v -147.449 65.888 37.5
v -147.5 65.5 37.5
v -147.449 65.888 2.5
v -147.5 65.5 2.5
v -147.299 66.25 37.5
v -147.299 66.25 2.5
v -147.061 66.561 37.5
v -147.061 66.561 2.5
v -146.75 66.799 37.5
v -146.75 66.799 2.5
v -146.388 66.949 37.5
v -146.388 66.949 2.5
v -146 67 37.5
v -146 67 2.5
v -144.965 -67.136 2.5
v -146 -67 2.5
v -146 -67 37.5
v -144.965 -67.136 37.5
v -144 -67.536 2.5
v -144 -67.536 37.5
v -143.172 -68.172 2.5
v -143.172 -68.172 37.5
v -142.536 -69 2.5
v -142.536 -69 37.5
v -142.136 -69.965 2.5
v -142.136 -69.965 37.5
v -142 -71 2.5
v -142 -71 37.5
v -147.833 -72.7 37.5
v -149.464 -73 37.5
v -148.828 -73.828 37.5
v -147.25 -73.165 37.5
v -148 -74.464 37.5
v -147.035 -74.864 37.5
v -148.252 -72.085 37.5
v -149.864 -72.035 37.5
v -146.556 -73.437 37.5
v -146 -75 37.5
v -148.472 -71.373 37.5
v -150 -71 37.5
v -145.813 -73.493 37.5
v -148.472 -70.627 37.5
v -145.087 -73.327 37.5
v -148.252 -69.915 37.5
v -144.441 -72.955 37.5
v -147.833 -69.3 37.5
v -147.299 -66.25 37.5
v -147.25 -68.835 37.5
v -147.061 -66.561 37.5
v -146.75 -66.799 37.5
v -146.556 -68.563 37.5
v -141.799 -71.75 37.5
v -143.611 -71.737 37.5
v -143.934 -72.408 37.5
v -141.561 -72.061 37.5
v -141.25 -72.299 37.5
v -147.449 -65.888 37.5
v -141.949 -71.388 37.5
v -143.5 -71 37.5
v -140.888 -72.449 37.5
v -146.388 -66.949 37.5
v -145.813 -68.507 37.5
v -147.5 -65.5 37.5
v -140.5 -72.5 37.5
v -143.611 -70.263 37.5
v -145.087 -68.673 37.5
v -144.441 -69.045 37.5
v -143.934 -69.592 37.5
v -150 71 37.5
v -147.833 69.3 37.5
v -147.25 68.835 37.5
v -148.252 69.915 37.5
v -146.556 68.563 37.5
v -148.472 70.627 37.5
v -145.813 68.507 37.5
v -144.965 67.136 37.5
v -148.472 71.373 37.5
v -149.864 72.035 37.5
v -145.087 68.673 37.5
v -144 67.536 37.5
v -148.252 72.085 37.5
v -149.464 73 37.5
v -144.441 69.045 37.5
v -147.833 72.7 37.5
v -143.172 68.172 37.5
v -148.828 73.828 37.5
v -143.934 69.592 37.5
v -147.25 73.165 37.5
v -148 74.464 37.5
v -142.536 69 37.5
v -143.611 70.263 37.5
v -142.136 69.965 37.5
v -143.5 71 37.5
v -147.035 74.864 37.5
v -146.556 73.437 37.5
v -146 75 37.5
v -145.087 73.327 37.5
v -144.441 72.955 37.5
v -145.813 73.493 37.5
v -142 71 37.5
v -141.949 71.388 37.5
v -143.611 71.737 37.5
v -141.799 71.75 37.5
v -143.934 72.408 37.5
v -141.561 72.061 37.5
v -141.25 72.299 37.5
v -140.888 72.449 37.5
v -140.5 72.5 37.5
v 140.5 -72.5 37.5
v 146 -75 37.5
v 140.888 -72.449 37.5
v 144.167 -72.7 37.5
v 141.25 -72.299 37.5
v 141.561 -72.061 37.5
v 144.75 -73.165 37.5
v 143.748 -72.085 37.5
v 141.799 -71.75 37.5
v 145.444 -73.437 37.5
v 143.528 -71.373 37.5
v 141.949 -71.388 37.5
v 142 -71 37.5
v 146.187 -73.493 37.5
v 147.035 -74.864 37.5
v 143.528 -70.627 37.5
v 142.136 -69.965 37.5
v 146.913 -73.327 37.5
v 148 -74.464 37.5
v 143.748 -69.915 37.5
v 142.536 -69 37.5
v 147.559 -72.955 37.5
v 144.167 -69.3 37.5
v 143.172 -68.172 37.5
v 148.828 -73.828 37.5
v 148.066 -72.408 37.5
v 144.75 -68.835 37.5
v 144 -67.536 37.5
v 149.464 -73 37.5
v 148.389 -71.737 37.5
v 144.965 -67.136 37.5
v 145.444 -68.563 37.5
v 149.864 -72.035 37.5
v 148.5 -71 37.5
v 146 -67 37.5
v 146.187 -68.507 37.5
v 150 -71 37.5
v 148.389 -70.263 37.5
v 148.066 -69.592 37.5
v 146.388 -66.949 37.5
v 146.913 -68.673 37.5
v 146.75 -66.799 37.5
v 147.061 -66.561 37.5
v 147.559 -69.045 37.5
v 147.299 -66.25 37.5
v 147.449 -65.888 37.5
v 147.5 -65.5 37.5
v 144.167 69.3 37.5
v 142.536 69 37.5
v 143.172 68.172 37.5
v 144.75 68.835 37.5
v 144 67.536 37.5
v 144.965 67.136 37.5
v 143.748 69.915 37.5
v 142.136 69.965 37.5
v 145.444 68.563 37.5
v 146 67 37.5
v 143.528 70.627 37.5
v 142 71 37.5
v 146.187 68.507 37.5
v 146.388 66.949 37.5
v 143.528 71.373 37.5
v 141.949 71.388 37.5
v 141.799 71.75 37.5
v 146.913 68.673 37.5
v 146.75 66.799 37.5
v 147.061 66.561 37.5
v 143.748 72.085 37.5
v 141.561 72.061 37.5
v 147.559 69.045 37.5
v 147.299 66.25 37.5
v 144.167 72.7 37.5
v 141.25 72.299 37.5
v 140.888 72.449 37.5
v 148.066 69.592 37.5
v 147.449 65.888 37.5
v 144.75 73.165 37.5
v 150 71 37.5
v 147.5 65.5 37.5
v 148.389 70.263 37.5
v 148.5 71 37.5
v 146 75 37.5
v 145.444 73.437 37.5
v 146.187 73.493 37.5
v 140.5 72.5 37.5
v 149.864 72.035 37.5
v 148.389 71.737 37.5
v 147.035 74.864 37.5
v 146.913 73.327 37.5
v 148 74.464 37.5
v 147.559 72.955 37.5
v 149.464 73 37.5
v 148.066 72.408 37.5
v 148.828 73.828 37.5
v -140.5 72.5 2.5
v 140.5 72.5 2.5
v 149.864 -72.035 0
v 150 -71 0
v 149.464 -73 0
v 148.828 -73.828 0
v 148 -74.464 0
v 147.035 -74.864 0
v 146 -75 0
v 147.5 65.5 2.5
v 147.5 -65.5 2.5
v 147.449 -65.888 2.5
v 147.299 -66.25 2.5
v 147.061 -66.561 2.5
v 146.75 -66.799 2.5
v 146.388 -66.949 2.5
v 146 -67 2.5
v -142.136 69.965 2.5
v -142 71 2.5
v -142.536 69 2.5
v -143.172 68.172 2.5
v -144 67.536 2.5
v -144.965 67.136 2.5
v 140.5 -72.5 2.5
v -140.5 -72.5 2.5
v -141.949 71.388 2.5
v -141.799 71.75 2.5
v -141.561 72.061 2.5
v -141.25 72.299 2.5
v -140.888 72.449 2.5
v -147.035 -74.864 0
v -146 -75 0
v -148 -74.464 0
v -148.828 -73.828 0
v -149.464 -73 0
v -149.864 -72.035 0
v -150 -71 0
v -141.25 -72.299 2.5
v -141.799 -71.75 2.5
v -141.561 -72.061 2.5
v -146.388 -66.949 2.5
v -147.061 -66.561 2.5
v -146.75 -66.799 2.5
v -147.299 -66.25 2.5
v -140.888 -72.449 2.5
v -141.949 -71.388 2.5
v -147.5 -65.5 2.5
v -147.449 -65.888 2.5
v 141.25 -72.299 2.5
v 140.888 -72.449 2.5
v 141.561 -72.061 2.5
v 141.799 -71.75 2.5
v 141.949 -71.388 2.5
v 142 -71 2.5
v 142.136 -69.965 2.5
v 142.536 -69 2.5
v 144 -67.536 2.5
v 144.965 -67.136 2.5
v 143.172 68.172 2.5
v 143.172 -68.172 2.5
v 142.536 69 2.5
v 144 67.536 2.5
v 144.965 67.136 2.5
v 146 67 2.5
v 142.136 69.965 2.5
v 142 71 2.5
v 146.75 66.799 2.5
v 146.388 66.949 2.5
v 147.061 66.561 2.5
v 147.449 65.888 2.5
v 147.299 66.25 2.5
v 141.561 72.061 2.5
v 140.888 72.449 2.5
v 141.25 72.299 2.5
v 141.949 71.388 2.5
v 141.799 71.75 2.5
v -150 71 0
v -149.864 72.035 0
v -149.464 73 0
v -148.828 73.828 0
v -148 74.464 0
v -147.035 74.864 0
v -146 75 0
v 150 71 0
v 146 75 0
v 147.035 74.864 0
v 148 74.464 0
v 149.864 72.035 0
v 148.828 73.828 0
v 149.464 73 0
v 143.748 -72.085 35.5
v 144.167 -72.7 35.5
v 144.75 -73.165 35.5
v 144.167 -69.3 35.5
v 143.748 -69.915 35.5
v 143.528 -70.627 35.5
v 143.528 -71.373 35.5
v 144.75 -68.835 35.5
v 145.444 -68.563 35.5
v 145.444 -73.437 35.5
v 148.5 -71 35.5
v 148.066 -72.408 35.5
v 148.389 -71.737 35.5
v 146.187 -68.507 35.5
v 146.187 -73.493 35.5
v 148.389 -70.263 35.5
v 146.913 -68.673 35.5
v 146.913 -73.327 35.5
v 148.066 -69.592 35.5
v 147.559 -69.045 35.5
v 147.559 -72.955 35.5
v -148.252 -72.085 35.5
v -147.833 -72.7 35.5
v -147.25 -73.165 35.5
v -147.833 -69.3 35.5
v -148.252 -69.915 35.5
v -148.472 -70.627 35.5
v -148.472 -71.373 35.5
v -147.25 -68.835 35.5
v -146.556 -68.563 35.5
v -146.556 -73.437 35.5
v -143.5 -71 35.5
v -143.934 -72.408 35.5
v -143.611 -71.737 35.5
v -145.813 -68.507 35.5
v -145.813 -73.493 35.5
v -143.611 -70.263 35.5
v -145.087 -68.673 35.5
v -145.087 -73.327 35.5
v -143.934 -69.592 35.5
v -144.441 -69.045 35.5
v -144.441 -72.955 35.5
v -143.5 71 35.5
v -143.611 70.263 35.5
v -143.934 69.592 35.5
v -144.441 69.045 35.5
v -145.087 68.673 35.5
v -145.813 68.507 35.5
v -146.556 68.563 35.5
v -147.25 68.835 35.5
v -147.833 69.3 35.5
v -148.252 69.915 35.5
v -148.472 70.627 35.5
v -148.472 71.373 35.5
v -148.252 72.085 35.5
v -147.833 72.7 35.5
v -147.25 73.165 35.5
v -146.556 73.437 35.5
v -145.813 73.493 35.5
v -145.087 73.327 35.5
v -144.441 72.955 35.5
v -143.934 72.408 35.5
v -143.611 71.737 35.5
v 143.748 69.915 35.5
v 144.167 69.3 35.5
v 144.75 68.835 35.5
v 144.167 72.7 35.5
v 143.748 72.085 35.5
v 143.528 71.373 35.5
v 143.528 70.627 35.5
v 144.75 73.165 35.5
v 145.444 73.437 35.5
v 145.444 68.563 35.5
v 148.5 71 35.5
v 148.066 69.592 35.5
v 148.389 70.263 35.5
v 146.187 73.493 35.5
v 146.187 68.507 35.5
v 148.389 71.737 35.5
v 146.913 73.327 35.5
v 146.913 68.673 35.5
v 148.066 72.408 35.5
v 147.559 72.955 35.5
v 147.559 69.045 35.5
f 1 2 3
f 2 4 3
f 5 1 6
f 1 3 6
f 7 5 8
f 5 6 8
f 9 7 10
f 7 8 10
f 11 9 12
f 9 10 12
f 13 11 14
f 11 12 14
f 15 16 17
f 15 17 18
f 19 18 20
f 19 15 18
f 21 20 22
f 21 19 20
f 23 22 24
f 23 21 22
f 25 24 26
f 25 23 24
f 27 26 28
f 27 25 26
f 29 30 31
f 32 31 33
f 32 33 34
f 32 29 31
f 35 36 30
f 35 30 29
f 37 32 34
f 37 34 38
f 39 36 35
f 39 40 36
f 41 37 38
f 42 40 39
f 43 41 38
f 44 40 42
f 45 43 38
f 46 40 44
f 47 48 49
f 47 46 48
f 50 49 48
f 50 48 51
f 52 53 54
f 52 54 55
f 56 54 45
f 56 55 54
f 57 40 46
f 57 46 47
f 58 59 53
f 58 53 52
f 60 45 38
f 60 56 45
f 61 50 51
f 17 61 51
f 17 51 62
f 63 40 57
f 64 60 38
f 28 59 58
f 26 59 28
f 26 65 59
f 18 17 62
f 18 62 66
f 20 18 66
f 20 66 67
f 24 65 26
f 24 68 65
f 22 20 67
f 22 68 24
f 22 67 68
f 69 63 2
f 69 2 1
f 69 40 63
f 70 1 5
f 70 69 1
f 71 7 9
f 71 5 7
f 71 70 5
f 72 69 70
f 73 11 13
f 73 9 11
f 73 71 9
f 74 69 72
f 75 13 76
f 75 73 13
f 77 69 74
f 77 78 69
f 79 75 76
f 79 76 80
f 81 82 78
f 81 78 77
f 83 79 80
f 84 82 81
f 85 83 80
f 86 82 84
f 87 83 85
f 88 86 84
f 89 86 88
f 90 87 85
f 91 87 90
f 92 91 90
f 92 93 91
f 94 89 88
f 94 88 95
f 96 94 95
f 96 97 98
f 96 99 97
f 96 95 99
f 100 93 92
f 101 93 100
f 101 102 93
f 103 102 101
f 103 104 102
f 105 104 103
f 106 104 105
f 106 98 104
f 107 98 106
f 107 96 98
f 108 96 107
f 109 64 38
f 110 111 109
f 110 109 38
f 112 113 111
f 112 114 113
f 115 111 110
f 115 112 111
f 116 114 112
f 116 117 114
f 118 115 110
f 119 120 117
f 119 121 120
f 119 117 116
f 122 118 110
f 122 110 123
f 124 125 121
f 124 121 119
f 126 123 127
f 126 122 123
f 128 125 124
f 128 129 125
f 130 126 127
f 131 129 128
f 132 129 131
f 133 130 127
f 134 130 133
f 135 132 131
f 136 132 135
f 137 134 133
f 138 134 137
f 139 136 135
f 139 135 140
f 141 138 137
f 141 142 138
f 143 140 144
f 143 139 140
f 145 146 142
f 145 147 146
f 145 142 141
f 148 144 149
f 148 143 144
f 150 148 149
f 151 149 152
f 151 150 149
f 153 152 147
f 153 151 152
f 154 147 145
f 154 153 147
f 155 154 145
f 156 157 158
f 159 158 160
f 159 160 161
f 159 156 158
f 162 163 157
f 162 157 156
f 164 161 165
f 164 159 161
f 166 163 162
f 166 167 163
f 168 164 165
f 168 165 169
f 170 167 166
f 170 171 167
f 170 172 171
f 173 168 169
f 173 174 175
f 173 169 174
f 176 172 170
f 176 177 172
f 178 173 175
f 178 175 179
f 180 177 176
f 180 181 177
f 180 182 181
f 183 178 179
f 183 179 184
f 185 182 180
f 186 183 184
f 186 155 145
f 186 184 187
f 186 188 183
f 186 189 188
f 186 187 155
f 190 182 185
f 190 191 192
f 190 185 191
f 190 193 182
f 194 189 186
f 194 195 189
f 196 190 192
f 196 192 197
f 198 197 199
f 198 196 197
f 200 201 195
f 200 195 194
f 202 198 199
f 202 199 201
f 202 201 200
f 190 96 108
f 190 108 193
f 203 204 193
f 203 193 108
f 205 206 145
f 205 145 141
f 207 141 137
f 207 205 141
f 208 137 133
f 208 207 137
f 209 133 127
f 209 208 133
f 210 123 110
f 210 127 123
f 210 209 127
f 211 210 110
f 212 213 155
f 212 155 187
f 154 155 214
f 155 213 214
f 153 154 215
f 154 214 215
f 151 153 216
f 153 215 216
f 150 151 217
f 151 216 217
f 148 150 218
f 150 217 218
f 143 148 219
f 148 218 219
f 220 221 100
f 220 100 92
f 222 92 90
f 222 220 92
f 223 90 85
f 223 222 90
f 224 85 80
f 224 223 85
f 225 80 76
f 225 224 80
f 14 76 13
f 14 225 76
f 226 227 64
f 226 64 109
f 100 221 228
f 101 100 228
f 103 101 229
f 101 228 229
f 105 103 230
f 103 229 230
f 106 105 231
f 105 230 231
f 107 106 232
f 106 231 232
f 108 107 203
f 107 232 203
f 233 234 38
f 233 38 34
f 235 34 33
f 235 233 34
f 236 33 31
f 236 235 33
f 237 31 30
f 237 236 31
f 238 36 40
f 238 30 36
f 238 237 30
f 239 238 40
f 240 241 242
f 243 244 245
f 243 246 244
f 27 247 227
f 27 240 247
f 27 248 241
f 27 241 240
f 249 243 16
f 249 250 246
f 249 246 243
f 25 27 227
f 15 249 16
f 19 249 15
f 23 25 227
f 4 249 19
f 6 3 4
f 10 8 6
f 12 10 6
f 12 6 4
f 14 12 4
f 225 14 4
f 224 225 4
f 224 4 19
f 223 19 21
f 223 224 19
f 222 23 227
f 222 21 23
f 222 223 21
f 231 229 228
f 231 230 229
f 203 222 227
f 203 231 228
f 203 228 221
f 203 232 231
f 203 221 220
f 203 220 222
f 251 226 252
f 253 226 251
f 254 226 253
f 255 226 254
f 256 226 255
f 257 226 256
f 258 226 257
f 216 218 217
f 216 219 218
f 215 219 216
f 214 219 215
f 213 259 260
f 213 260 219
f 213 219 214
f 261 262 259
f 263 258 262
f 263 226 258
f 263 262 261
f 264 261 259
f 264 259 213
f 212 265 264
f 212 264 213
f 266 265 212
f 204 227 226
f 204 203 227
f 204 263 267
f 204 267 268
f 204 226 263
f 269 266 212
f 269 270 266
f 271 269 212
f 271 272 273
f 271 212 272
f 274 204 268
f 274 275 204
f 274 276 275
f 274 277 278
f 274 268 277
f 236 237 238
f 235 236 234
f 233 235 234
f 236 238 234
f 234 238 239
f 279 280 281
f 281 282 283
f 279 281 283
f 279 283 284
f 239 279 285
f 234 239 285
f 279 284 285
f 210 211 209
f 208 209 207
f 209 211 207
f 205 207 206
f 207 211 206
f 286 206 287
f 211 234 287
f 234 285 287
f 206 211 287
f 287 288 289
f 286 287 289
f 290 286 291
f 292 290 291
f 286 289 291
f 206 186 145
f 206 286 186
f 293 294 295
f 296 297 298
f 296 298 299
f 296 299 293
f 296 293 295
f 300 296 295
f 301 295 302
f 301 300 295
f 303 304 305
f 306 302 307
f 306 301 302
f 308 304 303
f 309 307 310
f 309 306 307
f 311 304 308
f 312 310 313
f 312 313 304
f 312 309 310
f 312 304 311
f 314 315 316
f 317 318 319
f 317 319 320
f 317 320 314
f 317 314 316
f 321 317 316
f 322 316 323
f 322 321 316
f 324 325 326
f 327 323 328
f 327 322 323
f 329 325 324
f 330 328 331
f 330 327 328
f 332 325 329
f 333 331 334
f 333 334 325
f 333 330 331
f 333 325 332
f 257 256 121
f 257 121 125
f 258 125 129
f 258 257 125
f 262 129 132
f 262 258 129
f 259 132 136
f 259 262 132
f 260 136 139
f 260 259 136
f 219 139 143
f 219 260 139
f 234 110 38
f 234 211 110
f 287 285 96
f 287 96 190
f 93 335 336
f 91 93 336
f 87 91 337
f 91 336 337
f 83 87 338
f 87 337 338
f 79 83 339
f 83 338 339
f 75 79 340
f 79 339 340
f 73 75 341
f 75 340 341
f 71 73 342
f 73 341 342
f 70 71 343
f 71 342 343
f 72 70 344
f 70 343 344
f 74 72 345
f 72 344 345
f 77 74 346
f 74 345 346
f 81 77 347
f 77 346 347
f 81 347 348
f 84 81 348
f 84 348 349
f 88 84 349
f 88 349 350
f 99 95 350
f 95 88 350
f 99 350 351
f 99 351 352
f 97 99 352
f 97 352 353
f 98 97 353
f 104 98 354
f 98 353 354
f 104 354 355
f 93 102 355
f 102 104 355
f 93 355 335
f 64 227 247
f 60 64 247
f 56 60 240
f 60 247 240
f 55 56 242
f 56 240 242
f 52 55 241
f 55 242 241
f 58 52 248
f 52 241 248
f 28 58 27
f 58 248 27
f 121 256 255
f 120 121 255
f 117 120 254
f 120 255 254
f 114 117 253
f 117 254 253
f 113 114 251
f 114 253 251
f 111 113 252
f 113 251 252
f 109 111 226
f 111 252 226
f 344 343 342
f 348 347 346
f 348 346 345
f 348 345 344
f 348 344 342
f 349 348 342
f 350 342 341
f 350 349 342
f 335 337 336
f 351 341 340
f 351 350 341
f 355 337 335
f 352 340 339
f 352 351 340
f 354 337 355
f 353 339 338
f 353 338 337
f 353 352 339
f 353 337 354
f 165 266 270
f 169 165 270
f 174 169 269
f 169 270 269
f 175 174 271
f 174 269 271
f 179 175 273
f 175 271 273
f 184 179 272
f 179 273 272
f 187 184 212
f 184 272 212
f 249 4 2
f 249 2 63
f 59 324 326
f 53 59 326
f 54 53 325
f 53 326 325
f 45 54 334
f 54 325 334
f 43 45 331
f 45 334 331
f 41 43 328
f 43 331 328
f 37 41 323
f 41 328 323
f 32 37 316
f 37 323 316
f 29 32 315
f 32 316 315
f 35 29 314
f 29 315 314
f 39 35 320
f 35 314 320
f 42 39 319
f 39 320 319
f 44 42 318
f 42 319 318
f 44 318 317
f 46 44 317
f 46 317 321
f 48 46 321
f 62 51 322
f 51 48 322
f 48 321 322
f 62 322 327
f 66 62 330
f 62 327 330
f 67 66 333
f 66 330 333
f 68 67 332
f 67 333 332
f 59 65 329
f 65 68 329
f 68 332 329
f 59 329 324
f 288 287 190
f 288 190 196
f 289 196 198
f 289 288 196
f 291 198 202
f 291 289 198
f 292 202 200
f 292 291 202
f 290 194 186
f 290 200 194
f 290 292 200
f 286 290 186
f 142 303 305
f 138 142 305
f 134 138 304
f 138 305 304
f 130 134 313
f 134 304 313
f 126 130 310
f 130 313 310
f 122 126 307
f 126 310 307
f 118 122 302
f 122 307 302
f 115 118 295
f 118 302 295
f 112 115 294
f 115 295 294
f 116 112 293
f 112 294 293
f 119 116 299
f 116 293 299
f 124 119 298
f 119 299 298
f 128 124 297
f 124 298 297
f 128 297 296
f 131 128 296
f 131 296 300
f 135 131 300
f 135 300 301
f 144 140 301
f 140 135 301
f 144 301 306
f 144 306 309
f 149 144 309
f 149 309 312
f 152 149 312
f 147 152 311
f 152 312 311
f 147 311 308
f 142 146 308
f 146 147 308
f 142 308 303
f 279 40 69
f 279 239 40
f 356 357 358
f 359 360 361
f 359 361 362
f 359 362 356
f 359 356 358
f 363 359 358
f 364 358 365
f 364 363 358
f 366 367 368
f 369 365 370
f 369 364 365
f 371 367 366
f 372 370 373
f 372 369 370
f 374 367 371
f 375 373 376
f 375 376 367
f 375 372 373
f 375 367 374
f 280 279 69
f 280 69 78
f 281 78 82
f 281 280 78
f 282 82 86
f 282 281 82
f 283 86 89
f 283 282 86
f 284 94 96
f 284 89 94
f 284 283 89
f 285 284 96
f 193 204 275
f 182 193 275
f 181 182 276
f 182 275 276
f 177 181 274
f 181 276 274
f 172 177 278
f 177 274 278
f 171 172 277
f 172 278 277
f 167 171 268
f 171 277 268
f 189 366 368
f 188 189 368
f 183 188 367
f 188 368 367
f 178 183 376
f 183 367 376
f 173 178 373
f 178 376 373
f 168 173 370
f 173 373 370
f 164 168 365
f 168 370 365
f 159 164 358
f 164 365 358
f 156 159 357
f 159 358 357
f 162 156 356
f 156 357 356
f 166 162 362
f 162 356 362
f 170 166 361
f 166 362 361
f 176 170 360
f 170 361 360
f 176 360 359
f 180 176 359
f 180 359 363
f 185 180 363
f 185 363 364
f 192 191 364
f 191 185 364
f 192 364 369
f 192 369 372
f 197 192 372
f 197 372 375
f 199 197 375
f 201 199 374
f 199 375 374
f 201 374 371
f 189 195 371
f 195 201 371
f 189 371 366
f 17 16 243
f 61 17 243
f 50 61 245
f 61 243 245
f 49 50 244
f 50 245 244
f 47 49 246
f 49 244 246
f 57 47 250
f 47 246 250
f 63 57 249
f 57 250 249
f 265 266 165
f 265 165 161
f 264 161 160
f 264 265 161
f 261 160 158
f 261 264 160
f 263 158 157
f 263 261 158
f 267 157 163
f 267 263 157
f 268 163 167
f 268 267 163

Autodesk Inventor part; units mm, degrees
ref_plane "YZ Plane" through (0, 0, 0) normal (1, 0, 0) x (0, 1, 0)
ref_plane "XZ Plane" through (0, 0, 0) normal (0, 1, 0) x (-1, 0, 0)
ref_plane "XY Plane" through (0, 0, 0) normal (0, 0, 1) x (1, 0, 0)
sketch "Sketch1" plane through (0, 0, 0) normal (0, 0, 1) x (1, 0, 0)
  line L0 (-150, -75) -> (150, -75) construction
  line L1 (150, -75) -> (150, 75) construction
  line L2 (150, 75) -> (-150, 75) construction
  line L3 (-150, 75) -> (-150, -75) construction
  line L4 (-150, -75) -> (150, 75) construction
  line L5 (150, -75) -> (-150, 75) construction
  line L6 (147.5, -72.5) -> (-147.5, -72.5) construction
  line L7 (-147.5, -72.5) -> (-147.5, 72.5) construction
  line L8 (-147.5, 72.5) -> (147.5, 72.5) construction
  line L9 (147.5, 72.5) -> (147.5, -72.5) construction
  line L10 (147.5, -72.5) -> (-147.5, 72.5) construction
  line L11 (-147.5, -72.5) -> (147.5, 72.5) construction
  line L12 (-150, 75) -> (-146, 75) construction
  line L13 (-146, 75) -> (-146, 71) construction
  line L14 (-146, 71) -> (-150, 71) construction
  line L15 (-150, 71) -> (-150, 75) construction
  arc A0 (-146, 75) -> (-150, 71) centre (-146, 71) ccw
  line L16 (-150, -75) -> (-146, -75) construction
  line L17 (-146, -75) -> (-146, -71) construction
  line L18 (-146, -71) -> (-150, -71) construction
  line L19 (-150, -71) -> (-150, -75) construction
  line L20 (150, -75) -> (146, -75) construction
  line L21 (146, -75) -> (146, -71) construction
  line L22 (146, -71) -> (150, -71) construction
  line L23 (150, -71) -> (150, -75) construction
  line L24 (150, 75) -> (146, 75) construction
  line L25 (146, 75) -> (146, 71) construction
  line L26 (146, 71) -> (150, 71) construction
  line L27 (150, 71) -> (150, 75) construction
  line L28 (-146, 75) -> (146, 75)
  arc A1 (150, 71) -> (146, 75) centre (146, 71) ccw
  line L29 (150, 71) -> (150, -71)
  arc A2 (146, -75) -> (150, -71) centre (146, -71) ccw
  line L30 (146, -75) -> (-146, -75)
  arc A3 (-150, -71) -> (-146, -75) centre (-146, -71) ccw
  line L31 (-150, -71) -> (-150, 71)
  circle A4 centre (-146, 71) radius 2.5
  circle A5 centre (-146, -71) radius 2.5
  circle A6 centre (146, -71) radius 2.5
  circle A7 centre (146, 71) radius 2.5
  line L32 (-146, 71) -> (-142, 71) construction
  line L33 (-142, 71) -> (-142, 67) construction
  line L34 (-142, 67) -> (-146, 67) construction
  line L35 (-146, 67) -> (-146, 71) construction
  line L36 (-146, -71) -> (-142, -71) construction
  line L37 (-142, -71) -> (-142, -67) construction
  line L38 (-142, -67) -> (-146, -67) construction
  line L39 (-146, -67) -> (-146, -71) construction
  line L40 (146, -71) -> (142, -71) construction
  line L41 (142, -71) -> (142, -67) construction
  line L42 (142, -67) -> (146, -67) construction
  line L43 (146, -67) -> (146, -71) construction
  line L44 (146, 71) -> (142, 71) construction
  line L45 (142, 71) -> (142, 67) construction
  line L46 (142, 67) -> (146, 67) construction
  line L47 (146, 67) -> (146, 71) construction
  arc A8 (-146, 67) -> (-142, 71) centre (-146, 71) ccw
  arc A9 (-142, -71) -> (-146, -67) centre (-146, -71) ccw
  arc A10 (146, -67) -> (142, -71) centre (146, -71) ccw
  arc A11 (142, 71) -> (146, 67) centre (146, 71) ccw
  line L48 (-142, 71) -> (-140.5, 71) construction
  line L49 (-140.5, 71) -> (-140.5, 72.5) construction
  line L50 (-140.5, 72.5) -> (-142, 72.5) construction
  line L51 (-142, 72.5) -> (-142, 71) construction
  line L52 (-146, 67) -> (-147.5, 67) construction
  line L53 (-147.5, 67) -> (-147.5, 65.5) construction
  line L54 (-147.5, 65.5) -> (-146, 65.5) construction
  line L55 (-146, 65.5) -> (-146, 67) construction
  line L56 (142, 71) -> (140.5, 71) construction
  line L57 (140.5, 71) -> (140.5, 72.5) construction
  line L58 (140.5, 72.5) -> (142, 72.5) construction
  line L59 (142, 72.5) -> (142, 71) construction
  line L60 (146, 67) -> (147.5, 67) construction
  line L61 (147.5, 67) -> (147.5, 65.5) construction
  line L62 (147.5, 65.5) -> (146, 65.5) construction
  line L63 (146, 65.5) -> (146, 67) construction
  line L64 (146, -67) -> (147.5, -67) construction
  line L65 (147.5, -67) -> (147.5, -65.5) construction
  line L66 (147.5, -65.5) -> (146, -65.5) construction
  line L67 (146, -65.5) -> (146, -67) construction
  line L68 (142, -71) -> (140.5, -71) construction
  line L69 (140.5, -71) -> (140.5, -72.5) construction
  line L70 (140.5, -72.5) -> (142, -72.5) construction
  line L71 (142, -72.5) -> (142, -71) construction
  line L72 (-142, -71) -> (-140.5, -71) construction
  line L73 (-140.5, -71) -> (-140.5, -72.5) construction
  line L74 (-140.5, -72.5) -> (-142, -72.5) construction
  line L75 (-142, -72.5) -> (-142, -71) construction
  line L76 (-146, -67) -> (-147.5, -67) construction
  line L77 (-147.5, -67) -> (-147.5, -65.5) construction
  line L78 (-147.5, -65.5) -> (-146, -65.5) construction
  line L79 (-146, -65.5) -> (-146, -67) construction
  arc A12 (-147.5, -65.5) -> (-146, -67) centre (-146, -65.5) ccw
  arc A13 (-142, -71) -> (-140.5, -72.5) centre (-140.5, -71) ccw
  arc A14 (-140.5, 72.5) -> (-142, 71) centre (-140.5, 71) ccw
  arc A15 (-146, 67) -> (-147.5, 65.5) centre (-146, 65.5) ccw
  arc A16 (140.5, -72.5) -> (142, -71) centre (140.5, -71) ccw
  arc A17 (146, -67) -> (147.5, -65.5) centre (146, -65.5) ccw
  line L80 (147.5, -65.5) -> (147.5, 65.5)
  arc A18 (147.5, 65.5) -> (146, 67) centre (146, 65.5) ccw
  arc A19 (142, 71) -> (140.5, 72.5) centre (140.5, 71) ccw
  line L81 (140.5, 72.5) -> (-140.5, 72.5)
  line L82 (-147.5, 65.5) -> (-147.5, -65.5)
  line L83 (-140.5, -72.5) -> (140.5, -72.5)
  line L84 (146, 75) -> (-146, 75)
  arc A20 (-146, 75) -> (-150, 71) centre (-146, 71) ccw
  line L85 (-150, 71) -> (-150, -71)
  arc A21 (-150, -71) -> (-146, -75) centre (-146, -71) ccw
  line L86 (-146, -75) -> (146, -75)
  arc A22 (146, -75) -> (150, -71) centre (146, -71) ccw
  line L87 (150, -71) -> (150, 71)
  arc A23 (150, 71) -> (146, 75) centre (146, 71) ccw
  arc A24 (142, 71) -> (146, 67) centre (146, 71) ccw
  arc A25 (142, 71) -> (140.5, 72.5) centre (140.5, 71) ccw
  line L88 (140.5, 72.5) -> (-140.5, 72.5)
  arc A26 (-140.5, 72.5) -> (-142, 71) centre (-140.5, 71) ccw
  arc A27 (-146, 67) -> (-142, 71) centre (-146, 71) ccw
  arc A28 (-146, 67) -> (-147.5, 65.5) centre (-146, 65.5) ccw
  line L89 (-147.5, 65.5) -> (-147.5, -65.5)
  arc A29 (-147.5, -65.5) -> (-146, -67) centre (-146, -65.5) ccw
  arc A30 (-142, -71) -> (-146, -67) centre (-146, -71) ccw
  arc A31 (-142, -71) -> (-140.5, -72.5) centre (-140.5, -71) ccw
  line L90 (-140.5, -72.5) -> (140.5, -72.5)
  arc A32 (140.5, -72.5) -> (142, -71) centre (140.5, -71) ccw
  arc A33 (146, -67) -> (142, -71) centre (146, -71) ccw
  arc A34 (146, -67) -> (147.5, -65.5) centre (146, -65.5) ccw
  line L91 (147.5, -65.5) -> (147.5, 65.5)
  arc A35 (147.5, 65.5) -> (146, 67) centre (146, 65.5) ccw
  point P0 (0, 0)
  dimension "d0" = 300
  dimension "d1" = 150
  dimension "d2" = 295
  dimension "d3" = 145
  dimension "d4" = 4
  dimension "d5" = 4
  dimension "d6" = 4
  dimension "d7" = 4
  dimension "d8" = 4
  dimension "d9" = 4
  dimension "d10" = 4
  dimension "d11" = 4
  dimension "d12" = 4
  dimension "d13" = 4
  dimension "d14" = 4
  dimension "d15" = 4
  dimension "d16" = 5
  dimension "d17" = 5
  dimension "d18" = 5
  dimension "d19" = 5
  dimension "d20" = 4
  dimension "d21" = 4
  dimension "d22" = 4
  dimension "d23" = 4
  dimension "d24" = 4
  dimension "d25" = 4
  dimension "d26" = 4
  dimension "d27" = 4
  dimension "d28" = 4
  dimension "d29" = 4
  dimension "d30" = 4
  dimension "d31" = 4
  dimension "d32" = 1.5
  dimension "d33" = 1.5
  dimension "d34" = 1.5
  dimension "d35" = 1.5
  dimension "d36" = 1.5
  dimension "d37" = 1.5
  dimension "d38" = 1.5
  dimension "d39" = 1.5
  dimension "d40" = 1.5
  dimension "d41" = 1.5
  dimension "d42" = 1.5
  dimension "d43" = 1.5
  dimension "d44" = 1.5
  dimension "d45" = 1.5
  dimension "d46" = 1.5
  dimension "d47" = 1.5
  dimension "d48" = 1.5
  dimension "d49" = 1.5
  dimension "d50" = 1.5
  dimension "d51" = 1.5
  dimension "d52" = 1.5
  dimension "d53" = 1.5
  dimension "d54" = 1.5
  dimension "d55" = 1.5
extrude "Extrusion1" add sketch "Sketch1" along normal blind 2.5 contours L28 A1 L29 A2 L30 A3 L31 A0 | A8 A14 L81 A19 A11 A18 L80 A17 A10 A16 L83 A13 A9 A12 L82 A15
extrude "Extrusion2" add sketch "Sketch1" along normal blind 37.5
extrude "Extrusion3" add sketch "Sketch1" along normal blind 35.5 contours A4 | A5 | A6 | A7
equation "\"d21\" = d20"
properties part number "electronics_box"
